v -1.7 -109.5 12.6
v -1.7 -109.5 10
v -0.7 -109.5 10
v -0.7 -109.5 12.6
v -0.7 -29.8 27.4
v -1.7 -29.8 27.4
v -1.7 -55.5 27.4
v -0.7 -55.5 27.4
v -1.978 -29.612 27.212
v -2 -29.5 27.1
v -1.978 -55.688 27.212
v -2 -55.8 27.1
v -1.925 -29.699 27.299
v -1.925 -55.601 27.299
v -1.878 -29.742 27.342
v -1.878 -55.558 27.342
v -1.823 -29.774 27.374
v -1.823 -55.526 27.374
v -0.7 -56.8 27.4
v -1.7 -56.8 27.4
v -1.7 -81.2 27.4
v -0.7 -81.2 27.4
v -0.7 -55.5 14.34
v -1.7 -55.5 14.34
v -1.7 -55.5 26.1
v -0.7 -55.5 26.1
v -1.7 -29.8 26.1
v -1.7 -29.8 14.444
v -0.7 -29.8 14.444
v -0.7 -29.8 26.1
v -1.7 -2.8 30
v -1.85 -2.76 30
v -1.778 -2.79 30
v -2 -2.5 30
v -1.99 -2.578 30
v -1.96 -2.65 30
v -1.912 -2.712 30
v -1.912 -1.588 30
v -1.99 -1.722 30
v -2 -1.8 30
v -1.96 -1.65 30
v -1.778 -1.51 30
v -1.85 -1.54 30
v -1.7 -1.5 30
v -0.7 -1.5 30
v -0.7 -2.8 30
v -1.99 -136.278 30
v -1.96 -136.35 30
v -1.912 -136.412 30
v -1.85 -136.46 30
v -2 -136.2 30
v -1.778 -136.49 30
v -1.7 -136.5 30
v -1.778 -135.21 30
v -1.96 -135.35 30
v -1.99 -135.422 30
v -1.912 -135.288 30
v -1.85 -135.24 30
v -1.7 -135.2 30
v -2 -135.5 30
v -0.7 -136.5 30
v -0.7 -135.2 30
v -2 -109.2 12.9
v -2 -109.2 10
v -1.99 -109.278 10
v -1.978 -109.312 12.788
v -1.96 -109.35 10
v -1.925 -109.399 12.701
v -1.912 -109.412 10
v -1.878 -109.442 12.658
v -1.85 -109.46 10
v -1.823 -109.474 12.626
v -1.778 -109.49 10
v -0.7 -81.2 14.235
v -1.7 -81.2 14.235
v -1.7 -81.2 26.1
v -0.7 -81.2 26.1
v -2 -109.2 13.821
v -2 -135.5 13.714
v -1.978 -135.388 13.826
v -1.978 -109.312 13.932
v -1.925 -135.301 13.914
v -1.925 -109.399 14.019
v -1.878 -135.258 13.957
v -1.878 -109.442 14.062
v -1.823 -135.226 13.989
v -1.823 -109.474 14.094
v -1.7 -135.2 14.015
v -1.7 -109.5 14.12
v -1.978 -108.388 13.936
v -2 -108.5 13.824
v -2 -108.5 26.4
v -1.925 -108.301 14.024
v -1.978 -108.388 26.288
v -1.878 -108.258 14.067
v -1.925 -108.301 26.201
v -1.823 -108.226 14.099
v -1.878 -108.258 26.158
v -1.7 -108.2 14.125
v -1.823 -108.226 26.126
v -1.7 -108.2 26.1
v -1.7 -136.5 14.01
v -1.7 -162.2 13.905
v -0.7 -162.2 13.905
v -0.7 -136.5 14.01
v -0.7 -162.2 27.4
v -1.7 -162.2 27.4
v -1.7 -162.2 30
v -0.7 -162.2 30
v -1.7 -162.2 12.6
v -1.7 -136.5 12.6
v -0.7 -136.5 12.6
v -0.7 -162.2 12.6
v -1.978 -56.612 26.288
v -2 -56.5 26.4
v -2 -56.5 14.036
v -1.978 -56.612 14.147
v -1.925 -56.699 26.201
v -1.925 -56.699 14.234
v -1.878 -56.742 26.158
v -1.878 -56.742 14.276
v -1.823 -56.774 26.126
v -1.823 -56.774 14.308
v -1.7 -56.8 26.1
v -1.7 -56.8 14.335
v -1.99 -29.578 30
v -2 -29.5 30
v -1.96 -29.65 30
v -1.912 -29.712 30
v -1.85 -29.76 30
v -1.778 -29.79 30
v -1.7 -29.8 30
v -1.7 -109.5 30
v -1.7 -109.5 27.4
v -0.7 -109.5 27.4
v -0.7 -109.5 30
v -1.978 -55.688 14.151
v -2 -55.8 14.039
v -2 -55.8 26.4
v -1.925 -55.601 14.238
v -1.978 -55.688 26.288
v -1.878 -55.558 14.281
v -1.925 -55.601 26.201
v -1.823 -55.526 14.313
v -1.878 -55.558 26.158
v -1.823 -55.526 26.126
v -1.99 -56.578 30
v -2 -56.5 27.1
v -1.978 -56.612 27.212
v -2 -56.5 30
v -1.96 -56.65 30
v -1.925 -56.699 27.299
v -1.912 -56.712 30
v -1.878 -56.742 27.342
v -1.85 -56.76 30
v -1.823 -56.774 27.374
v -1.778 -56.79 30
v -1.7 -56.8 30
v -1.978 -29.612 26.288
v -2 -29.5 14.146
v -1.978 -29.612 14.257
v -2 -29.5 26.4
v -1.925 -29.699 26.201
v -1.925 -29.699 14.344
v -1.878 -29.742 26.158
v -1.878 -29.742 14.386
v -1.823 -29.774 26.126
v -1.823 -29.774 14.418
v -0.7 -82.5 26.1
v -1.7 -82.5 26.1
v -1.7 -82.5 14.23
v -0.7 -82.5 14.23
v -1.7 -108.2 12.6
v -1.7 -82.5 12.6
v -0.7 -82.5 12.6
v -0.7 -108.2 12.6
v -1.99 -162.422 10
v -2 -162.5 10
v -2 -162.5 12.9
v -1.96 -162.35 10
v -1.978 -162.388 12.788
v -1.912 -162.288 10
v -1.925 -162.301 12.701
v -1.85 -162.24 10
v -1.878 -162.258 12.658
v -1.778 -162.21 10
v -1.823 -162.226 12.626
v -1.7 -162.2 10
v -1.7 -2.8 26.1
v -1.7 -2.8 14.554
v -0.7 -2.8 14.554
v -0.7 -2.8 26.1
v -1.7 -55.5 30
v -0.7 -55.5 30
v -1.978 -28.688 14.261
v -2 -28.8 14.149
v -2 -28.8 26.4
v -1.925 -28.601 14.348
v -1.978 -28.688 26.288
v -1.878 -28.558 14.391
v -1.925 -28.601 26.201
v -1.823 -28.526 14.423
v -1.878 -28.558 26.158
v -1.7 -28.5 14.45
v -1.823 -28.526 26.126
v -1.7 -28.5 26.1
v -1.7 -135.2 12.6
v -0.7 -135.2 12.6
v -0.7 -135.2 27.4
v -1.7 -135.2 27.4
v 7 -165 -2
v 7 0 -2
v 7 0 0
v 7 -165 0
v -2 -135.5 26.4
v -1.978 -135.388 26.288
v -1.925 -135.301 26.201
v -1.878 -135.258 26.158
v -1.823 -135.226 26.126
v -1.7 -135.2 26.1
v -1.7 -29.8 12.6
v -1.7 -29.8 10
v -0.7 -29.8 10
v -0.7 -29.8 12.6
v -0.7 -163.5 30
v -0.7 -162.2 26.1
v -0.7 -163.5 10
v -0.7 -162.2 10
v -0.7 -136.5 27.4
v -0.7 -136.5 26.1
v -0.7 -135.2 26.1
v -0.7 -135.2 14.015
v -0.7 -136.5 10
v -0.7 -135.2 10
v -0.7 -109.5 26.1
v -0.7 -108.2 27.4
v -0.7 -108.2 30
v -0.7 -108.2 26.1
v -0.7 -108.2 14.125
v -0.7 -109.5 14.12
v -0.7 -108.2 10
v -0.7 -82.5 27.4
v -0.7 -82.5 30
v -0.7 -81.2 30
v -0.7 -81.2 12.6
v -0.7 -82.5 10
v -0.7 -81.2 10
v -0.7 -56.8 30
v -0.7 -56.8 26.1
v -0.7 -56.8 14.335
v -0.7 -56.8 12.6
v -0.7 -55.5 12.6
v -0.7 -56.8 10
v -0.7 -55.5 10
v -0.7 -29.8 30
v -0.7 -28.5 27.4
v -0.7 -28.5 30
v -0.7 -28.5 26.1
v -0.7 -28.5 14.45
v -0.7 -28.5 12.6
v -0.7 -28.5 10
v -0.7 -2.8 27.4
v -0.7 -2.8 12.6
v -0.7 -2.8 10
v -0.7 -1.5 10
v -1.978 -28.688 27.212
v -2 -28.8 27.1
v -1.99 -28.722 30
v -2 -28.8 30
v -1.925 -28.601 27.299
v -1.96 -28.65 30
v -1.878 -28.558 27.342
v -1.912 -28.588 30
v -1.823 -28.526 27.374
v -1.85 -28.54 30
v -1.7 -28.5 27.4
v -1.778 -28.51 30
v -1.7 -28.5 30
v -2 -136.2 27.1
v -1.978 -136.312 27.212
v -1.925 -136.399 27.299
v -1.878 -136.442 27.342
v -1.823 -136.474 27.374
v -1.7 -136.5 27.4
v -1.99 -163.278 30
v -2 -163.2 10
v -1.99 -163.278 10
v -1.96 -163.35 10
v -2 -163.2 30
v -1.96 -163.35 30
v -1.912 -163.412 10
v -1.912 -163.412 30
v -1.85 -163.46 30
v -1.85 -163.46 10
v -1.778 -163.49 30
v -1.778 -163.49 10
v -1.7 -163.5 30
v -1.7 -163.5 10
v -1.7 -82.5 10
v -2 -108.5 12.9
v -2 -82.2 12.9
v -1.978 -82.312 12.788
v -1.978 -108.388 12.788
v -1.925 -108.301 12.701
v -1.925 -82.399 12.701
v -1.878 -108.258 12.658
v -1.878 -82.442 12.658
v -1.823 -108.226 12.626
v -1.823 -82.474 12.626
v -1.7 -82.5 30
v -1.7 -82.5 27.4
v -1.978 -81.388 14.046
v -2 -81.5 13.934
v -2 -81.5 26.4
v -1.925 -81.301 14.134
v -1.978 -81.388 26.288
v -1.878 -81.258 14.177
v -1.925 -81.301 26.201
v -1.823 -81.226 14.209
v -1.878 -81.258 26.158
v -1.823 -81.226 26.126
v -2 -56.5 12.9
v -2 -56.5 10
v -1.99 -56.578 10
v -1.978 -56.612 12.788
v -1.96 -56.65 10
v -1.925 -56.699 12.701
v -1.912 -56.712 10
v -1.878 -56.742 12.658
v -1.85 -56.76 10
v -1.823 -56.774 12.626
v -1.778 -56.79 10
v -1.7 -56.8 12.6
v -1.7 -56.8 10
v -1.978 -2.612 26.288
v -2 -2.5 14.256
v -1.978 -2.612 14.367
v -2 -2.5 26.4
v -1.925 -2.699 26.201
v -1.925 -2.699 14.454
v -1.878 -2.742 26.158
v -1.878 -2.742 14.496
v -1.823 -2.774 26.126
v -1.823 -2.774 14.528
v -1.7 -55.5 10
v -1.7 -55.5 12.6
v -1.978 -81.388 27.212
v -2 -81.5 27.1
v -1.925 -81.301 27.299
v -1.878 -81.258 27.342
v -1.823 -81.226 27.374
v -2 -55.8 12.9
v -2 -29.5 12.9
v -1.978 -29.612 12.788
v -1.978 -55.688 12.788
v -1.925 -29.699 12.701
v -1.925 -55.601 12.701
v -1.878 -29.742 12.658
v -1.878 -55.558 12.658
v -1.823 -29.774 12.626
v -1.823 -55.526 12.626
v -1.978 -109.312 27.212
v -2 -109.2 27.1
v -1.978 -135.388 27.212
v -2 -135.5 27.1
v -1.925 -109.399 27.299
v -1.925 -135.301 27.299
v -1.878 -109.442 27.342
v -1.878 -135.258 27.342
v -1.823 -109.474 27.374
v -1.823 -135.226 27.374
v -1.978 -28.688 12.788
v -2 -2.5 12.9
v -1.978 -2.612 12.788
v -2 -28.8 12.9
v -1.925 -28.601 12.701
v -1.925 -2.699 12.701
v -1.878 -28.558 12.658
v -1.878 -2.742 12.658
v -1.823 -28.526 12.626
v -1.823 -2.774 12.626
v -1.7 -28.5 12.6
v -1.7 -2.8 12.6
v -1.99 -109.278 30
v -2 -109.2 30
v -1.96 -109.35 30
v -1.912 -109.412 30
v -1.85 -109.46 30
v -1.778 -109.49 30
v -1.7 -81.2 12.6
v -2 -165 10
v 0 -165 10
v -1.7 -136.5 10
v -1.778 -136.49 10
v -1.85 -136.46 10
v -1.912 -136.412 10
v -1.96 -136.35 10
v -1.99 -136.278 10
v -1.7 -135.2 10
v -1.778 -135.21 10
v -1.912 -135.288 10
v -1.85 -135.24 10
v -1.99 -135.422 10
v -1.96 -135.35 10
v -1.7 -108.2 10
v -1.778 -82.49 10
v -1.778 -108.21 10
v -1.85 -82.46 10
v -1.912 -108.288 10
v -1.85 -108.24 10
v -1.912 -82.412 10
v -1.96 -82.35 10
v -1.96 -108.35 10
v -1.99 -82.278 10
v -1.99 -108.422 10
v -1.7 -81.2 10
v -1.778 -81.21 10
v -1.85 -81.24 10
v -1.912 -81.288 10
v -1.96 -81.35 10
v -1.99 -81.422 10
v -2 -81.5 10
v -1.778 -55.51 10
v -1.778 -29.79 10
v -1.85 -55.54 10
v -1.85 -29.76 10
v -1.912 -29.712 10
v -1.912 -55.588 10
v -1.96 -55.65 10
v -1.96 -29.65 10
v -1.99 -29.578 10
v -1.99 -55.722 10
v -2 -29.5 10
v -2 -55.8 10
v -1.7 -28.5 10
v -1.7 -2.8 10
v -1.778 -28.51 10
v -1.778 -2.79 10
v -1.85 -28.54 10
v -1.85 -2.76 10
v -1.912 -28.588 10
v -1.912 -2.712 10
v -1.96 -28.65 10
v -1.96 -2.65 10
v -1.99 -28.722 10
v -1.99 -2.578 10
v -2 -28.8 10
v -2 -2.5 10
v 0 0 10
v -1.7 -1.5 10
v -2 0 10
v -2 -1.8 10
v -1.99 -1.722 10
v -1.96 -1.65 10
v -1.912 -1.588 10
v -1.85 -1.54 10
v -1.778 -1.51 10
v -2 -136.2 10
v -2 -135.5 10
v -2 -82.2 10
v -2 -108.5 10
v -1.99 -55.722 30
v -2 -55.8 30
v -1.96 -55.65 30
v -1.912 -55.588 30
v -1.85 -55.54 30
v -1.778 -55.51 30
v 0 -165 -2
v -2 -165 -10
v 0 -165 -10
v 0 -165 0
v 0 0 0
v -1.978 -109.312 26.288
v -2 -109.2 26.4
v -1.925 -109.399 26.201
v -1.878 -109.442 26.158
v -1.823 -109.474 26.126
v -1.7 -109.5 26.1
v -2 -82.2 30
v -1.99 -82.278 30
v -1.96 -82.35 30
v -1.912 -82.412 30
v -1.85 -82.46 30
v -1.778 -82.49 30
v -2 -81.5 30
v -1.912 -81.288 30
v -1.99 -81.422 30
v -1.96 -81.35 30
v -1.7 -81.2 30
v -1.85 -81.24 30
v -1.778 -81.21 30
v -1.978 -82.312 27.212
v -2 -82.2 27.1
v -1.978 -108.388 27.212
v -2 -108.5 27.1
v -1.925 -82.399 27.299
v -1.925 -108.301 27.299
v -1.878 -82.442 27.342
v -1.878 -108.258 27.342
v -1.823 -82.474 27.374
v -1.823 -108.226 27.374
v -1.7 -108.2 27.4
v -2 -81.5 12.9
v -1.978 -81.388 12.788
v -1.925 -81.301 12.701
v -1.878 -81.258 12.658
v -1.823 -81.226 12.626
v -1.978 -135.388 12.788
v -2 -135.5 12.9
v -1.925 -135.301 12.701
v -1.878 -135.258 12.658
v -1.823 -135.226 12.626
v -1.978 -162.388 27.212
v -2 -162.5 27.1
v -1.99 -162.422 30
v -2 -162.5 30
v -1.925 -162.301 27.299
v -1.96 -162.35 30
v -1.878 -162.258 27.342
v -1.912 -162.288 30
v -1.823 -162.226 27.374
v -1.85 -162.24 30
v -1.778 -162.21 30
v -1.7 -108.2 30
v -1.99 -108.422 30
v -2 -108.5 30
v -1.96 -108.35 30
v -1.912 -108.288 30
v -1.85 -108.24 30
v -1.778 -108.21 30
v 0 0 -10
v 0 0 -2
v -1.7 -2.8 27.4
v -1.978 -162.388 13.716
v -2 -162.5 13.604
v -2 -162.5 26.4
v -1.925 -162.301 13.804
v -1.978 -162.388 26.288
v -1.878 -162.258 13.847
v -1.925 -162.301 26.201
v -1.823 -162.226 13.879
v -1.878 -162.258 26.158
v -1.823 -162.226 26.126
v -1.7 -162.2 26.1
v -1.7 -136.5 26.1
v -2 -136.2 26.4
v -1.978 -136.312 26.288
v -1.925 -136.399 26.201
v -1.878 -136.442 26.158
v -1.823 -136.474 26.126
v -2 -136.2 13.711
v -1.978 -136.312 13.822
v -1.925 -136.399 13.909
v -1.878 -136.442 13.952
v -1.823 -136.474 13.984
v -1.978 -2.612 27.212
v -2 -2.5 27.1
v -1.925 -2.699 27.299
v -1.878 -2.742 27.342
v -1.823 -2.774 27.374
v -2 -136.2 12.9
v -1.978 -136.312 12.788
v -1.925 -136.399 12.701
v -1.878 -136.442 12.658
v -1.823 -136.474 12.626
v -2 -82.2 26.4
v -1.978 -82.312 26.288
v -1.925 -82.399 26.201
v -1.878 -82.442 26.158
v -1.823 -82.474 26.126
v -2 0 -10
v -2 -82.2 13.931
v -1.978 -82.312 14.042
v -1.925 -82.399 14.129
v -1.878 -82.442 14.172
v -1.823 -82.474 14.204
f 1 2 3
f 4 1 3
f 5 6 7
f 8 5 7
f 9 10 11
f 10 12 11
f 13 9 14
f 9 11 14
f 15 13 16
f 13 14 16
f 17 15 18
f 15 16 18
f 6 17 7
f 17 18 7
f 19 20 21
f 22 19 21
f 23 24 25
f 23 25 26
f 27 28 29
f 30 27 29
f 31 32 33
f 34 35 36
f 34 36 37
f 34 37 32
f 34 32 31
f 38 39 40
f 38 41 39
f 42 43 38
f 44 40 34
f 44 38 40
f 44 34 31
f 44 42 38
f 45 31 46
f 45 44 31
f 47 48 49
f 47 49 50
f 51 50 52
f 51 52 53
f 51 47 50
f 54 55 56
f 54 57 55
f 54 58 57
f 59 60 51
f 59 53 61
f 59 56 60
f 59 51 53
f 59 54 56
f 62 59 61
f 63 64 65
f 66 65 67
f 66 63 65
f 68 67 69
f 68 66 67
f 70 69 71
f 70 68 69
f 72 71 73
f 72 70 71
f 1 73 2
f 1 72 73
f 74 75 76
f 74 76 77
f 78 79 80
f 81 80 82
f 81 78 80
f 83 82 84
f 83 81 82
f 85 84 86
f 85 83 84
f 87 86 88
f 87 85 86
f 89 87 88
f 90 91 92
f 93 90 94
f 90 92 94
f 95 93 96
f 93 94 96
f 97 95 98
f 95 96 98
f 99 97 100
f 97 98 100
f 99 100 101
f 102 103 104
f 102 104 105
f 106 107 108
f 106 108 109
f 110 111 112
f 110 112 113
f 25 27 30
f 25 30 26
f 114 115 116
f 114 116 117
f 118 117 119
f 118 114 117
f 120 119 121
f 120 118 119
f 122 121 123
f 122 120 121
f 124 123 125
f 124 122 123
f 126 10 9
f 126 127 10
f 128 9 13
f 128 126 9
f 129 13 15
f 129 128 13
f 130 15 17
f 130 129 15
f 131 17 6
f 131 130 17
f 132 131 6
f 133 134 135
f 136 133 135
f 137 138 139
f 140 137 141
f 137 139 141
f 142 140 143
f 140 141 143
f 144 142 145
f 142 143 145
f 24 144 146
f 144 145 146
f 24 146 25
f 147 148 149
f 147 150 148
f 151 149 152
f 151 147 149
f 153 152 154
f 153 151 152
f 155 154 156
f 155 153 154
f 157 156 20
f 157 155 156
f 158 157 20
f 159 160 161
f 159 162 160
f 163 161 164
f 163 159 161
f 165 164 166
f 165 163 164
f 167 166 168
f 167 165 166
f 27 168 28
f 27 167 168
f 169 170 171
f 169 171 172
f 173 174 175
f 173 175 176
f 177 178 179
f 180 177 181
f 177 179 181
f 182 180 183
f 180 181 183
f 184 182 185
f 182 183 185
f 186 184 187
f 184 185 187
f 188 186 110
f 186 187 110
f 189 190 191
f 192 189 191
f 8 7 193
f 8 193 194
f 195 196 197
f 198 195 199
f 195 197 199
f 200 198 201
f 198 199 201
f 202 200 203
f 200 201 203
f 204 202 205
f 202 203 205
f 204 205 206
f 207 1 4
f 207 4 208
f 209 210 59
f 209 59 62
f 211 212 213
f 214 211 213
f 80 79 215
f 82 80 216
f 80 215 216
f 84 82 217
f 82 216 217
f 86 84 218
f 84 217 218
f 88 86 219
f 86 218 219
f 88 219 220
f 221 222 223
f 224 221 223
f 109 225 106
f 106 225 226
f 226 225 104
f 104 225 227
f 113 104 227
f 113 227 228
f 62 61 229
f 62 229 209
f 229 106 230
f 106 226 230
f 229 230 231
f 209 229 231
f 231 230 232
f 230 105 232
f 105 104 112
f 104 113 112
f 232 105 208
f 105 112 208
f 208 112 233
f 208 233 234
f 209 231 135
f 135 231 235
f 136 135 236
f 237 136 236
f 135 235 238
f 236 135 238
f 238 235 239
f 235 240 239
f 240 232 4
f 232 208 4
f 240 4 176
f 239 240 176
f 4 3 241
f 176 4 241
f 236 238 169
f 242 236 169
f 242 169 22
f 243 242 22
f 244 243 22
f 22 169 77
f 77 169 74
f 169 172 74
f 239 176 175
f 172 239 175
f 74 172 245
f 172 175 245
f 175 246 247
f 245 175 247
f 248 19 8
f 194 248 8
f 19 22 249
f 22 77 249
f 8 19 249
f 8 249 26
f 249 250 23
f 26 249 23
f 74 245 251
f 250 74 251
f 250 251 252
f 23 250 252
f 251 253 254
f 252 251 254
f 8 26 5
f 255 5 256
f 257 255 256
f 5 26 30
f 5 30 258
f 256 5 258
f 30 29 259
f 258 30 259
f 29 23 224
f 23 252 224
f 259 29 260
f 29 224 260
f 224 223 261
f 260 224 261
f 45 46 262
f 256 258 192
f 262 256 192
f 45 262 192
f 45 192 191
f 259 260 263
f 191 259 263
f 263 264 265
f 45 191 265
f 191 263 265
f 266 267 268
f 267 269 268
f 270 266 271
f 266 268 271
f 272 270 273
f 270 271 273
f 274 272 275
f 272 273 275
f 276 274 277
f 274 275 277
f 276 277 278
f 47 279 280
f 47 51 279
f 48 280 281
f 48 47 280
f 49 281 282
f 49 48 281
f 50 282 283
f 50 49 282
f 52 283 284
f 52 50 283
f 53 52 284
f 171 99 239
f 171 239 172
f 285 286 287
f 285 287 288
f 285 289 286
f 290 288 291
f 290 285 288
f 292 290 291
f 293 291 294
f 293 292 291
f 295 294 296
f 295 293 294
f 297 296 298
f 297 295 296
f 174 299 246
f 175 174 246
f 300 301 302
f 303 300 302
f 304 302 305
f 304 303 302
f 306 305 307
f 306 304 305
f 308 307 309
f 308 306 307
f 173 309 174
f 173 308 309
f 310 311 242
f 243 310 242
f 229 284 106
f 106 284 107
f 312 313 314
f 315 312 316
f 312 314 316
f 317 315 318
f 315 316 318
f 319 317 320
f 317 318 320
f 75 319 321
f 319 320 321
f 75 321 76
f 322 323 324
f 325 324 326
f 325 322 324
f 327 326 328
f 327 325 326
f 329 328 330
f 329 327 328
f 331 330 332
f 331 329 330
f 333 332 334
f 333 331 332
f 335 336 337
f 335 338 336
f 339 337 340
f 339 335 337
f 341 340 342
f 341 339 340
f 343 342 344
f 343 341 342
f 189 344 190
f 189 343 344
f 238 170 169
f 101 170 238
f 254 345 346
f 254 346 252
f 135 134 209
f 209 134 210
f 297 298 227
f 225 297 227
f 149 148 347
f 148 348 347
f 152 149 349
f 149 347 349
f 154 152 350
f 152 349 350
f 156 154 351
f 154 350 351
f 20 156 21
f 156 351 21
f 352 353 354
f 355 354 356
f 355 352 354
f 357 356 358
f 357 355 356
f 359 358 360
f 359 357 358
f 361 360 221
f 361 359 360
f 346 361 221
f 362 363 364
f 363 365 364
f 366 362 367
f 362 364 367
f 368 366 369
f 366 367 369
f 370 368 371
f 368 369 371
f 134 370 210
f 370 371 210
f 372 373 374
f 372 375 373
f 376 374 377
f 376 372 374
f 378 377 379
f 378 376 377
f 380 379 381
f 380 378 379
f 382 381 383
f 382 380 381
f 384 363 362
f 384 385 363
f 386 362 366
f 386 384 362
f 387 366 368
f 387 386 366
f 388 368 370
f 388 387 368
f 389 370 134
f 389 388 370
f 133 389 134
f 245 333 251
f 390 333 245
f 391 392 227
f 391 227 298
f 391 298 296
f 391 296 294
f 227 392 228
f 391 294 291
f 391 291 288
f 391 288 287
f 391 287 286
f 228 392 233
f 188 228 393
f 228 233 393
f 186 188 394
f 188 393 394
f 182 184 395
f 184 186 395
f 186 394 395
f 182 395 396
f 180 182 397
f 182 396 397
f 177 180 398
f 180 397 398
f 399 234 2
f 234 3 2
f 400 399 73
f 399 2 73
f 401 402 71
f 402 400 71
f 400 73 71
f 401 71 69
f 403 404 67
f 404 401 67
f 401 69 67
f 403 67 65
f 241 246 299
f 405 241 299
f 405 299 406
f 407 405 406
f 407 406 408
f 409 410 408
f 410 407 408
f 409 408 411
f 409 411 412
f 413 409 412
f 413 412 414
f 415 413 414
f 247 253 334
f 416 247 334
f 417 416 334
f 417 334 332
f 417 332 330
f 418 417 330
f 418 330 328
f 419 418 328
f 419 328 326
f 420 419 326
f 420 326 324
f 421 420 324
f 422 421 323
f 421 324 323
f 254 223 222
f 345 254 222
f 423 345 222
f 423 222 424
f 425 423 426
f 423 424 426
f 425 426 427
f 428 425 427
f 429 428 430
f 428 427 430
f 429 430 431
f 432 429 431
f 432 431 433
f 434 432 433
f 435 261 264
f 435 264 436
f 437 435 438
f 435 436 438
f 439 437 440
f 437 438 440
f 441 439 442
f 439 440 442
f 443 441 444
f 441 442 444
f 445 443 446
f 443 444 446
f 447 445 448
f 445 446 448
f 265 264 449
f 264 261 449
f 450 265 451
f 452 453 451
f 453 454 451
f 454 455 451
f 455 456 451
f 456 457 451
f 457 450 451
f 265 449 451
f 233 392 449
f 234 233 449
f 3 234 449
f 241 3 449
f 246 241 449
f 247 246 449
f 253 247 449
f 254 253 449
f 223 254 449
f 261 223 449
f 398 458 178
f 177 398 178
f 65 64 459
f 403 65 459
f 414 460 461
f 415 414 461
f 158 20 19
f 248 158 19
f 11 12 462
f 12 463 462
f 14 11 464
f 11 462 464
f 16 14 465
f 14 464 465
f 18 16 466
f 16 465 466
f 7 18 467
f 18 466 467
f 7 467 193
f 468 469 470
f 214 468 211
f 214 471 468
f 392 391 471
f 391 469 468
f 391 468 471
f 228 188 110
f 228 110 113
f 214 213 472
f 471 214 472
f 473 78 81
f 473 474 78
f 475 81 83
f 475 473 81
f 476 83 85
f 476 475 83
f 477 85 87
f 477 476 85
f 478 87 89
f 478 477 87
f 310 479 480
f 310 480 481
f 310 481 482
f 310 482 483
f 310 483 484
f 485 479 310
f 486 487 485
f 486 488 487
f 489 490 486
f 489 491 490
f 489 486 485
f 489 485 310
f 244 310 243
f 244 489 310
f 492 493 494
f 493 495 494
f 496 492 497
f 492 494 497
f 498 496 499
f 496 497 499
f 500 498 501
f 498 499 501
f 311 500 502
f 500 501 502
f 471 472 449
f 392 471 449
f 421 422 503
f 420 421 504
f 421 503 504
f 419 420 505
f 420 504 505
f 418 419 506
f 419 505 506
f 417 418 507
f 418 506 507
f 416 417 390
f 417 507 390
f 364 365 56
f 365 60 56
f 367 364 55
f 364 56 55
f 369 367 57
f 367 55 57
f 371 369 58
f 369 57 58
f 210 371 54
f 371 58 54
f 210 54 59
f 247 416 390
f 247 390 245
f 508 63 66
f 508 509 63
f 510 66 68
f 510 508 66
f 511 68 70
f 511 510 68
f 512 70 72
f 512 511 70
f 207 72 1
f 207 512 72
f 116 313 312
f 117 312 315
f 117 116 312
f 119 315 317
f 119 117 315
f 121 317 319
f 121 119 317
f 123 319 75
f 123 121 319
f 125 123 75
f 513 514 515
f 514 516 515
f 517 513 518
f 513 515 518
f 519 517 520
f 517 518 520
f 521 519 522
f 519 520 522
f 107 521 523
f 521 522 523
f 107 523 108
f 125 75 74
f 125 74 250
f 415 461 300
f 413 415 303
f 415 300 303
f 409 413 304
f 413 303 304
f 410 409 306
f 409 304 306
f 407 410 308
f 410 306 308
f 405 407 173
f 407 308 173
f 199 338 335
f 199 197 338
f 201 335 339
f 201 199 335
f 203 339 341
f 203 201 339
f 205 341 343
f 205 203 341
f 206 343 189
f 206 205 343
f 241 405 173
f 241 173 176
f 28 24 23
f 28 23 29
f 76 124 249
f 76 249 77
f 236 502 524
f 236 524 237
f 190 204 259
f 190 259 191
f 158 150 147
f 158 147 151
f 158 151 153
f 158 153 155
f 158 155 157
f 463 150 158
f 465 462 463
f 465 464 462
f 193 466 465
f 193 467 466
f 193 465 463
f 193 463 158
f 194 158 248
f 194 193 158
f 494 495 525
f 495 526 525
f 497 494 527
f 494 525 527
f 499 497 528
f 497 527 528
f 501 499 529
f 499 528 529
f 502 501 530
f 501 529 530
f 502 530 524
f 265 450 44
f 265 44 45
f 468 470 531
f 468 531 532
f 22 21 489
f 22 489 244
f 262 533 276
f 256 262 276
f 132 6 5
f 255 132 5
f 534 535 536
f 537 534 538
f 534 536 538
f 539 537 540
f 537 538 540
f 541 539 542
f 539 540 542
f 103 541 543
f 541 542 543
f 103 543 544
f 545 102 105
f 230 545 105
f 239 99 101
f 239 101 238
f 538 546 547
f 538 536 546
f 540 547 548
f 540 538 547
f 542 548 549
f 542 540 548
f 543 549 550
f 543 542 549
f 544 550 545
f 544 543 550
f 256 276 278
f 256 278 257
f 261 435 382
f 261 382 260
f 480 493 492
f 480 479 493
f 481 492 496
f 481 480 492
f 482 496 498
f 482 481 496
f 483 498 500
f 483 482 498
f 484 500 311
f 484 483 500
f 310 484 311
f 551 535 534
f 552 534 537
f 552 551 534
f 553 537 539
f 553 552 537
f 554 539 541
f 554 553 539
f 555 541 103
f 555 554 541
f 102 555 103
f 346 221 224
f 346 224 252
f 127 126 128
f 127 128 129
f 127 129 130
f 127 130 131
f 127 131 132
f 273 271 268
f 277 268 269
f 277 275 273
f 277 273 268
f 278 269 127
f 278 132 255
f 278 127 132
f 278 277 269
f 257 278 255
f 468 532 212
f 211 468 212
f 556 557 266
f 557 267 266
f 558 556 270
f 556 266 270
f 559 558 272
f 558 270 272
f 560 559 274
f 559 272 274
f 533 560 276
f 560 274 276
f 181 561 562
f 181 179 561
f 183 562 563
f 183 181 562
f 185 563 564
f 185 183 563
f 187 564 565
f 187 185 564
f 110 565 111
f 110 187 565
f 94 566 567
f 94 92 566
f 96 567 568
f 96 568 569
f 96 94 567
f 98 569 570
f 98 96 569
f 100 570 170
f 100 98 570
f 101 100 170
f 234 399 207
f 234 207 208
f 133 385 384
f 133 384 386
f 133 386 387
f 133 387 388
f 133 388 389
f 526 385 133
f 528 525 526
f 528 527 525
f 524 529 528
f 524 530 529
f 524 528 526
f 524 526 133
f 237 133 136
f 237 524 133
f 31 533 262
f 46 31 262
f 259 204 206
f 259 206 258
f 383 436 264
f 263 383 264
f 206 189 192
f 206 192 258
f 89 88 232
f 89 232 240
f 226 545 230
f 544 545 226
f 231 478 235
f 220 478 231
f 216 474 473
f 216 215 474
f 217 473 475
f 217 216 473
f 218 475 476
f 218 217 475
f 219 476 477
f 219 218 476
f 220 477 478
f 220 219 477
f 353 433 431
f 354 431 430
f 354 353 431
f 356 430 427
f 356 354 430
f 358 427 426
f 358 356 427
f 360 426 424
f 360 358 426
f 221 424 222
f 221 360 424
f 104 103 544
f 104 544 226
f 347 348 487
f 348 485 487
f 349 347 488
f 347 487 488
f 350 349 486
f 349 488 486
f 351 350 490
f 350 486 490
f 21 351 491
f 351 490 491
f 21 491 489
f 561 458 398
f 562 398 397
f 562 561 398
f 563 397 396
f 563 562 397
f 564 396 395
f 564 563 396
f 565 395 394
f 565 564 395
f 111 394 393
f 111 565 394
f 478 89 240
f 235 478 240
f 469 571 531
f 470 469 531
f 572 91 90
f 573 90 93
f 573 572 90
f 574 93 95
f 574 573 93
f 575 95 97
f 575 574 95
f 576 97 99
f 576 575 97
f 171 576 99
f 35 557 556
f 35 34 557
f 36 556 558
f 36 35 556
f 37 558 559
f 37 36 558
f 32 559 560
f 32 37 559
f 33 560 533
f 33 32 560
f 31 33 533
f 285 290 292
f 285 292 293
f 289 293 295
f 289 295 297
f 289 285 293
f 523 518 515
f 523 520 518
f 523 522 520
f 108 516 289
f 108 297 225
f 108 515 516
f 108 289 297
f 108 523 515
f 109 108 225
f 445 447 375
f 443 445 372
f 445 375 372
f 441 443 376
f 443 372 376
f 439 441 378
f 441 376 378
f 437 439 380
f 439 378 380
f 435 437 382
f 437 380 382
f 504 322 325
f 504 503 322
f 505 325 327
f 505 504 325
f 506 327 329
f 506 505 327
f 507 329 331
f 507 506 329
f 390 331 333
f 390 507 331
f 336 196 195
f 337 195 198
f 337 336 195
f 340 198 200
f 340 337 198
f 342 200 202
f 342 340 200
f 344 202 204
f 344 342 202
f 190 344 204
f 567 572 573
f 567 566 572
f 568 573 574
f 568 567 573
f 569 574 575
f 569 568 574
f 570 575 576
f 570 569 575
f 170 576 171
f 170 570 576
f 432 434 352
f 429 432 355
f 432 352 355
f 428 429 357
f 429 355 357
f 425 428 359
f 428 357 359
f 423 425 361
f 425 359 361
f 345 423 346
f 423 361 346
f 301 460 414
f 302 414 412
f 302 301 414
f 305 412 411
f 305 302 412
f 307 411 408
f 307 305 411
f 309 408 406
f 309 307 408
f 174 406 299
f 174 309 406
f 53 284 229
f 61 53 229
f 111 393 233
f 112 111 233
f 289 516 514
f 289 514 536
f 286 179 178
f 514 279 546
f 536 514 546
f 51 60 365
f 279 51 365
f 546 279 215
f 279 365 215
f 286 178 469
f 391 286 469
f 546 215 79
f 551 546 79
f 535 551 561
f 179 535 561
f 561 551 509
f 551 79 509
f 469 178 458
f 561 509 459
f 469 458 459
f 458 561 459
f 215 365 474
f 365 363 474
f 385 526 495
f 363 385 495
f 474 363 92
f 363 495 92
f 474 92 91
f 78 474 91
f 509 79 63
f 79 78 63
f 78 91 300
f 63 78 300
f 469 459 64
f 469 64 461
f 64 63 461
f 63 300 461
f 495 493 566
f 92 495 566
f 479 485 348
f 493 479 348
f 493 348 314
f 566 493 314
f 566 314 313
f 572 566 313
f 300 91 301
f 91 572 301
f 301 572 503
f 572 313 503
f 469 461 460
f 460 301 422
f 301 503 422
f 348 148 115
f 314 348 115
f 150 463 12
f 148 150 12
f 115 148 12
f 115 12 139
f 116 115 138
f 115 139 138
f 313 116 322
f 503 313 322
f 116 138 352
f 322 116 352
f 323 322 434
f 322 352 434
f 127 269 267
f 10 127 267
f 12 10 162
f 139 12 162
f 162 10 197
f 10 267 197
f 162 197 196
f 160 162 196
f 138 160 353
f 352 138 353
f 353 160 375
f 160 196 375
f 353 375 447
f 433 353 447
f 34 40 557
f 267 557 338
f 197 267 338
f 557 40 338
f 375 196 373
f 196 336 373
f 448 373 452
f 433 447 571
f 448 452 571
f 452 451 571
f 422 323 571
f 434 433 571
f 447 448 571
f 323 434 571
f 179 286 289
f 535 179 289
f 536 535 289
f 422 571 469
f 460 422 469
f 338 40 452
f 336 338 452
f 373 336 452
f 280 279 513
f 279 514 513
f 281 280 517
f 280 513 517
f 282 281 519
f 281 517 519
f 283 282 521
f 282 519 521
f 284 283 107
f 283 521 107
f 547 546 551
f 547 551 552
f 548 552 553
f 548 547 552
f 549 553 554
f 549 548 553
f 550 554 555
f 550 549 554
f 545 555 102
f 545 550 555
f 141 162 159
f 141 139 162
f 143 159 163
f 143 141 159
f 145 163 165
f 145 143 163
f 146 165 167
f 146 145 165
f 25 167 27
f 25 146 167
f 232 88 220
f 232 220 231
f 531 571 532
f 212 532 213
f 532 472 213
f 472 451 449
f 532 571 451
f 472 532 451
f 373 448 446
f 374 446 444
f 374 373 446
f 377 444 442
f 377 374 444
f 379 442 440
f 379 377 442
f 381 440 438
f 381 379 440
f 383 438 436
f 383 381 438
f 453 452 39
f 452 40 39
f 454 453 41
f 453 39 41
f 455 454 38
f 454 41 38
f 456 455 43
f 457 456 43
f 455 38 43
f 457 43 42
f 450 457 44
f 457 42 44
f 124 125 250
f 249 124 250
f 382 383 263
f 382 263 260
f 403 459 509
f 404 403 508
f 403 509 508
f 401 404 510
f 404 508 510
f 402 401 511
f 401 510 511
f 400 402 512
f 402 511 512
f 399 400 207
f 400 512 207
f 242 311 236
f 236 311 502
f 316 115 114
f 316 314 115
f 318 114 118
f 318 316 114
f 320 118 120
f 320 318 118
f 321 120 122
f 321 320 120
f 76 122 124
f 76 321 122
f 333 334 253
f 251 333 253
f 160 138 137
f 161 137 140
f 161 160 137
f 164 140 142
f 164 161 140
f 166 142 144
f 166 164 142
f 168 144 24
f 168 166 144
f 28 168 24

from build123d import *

# Parameters (mm, degrees)
F1_DEPTH = 165
F2_W     = 1.3
F2_H     = 1.3
F3_DEPTH = 20
F4_W     = 25.7
F4_H     = 1.3
F4_W_2   = 24.4
F5_DEPTH = 1.3
F6_R     = 0.3


with BuildPart() as f1:
    # F0 (on Front) → F1 (new body)
    with BuildSketch(Plane.XZ):
        Polygon((7, 0), (0, 0), (0, 10), (-2, 10), (-2, -10), (0, -10), (0, -2), (7, -2), align=None)
    extrude(amount=F1_DEPTH)

    # F2 (on face) → F3 (join)
    with BuildSketch(Plane.XY.offset(10)):
        with Locations((-1.35, -2.15)):
            Rectangle(F2_W, F2_H)
        with Locations((-1.35, -29.15)):
            Rectangle(F2_W, F2_H)
        with Locations((-1.35, -56.15)):
            Rectangle(F2_W, F2_H)
        with Locations((-1.35, -81.85)):
            Rectangle(F2_W, F2_H)
        with Locations((-1.35, -108.85)):
            Rectangle(F2_W, F2_H)
        with Locations((-1.35, -135.85)):
            Rectangle(F2_W, F2_H)
        with Locations((-1.35, -162.85)):
            Rectangle(F2_W, F2_H)
    extrude(amount=F3_DEPTH)

    # F4 (on face) → F5 (join)
    with BuildSketch(Plane(origin=(-2, 0, 0), x_dir=(0, -1, 0), z_dir=(-1, 0, 0))):
        Polygon((2.8, 14.5544293599), (2.8, 12.6), (28.5, 12.6), (28.5, 14.4497695307), align=None)
        with Locations((15.65, 26.75)):
            Rectangle(F4_W, F4_H)
        with Locations((42.65, 26.75)):
            Rectangle(F4_W, F4_H)
        Polygon((29.8, 14.4444754537), (29.8, 12.6), (55.5, 12.6), (55.5, 14.3398156246), align=None)
        with Locations((69, 26.75)):
            Rectangle(F4_W_2, F4_H)
        Polygon((56.8, 14.3345215476), (56.8, 12.6), (81.2, 12.6), (81.2, 14.2351557954), align=None)
        Polygon((82.5, 14.2298617184), (82.5, 12.6), (108.2, 12.6), (108.2, 14.1252018892), align=None)
        with Locations((95.35, 26.75)):
            Rectangle(F4_W, F4_H)
        with Locations((122.35, 26.75)):
            Rectangle(F4_W, F4_H)
        Polygon((109.5, 12.6), (135.2, 12.6), (135.2, 14.0152479831), (109.5, 14.1199078123), align=None)
        Polygon((136.5, 12.6), (162.2, 12.6), (162.2, 13.905294077), (136.5, 14.0099539061), align=None)
        with Locations((149.35, 26.75)):
            Rectangle(F4_W, F4_H)
    extrude(amount=-F5_DEPTH)

    # F6
    f6_edges = [f1.edges().sort_by_distance(p)[0] for p in [
        (-2, -135.2, 11.3),
        (-2, -136.5, 11.3),
        (-2, -149.35, 12.6),
        (-2, -149.35, 13.957624),
        (-2, -162.2, 11.3),
        (-2, -163.5, 20),
        (-2, -162.2, 20.002647),
        (-2, -149.35, 27.4),
        (-2, -149.35, 26.1),
        (-2, -136.5, 20.054977),
        (-2, -136.5, 28.7),
        (-2, -135.2, 28.7),
        (-2, -135.2, 20.057624),
        (-2, -122.35, 14.067578),
        (-2, -122.35, 12.6),
        (-2, -122.35, 26.1),
        (-2, -122.35, 27.4),
        (-2, -162.2, 28.7),
        (-2, -109.5, 28.7),
        (-2, -95.35, 27.4),
        (-2, -95.35, 14.177532),
        (-2, -108.2, 20.112601),
        (-2, -95.35, 12.6),
        (-2, -108.2, 11.3),
        (-2, -82.5, 20.164931),
        (-2, -82.5, 28.7),
        (-2, -69, 27.4),
        (-2, -69, 26.1),
        (-2, -81.2, 20.167578),
        (-2, -69, 14.284839),
        (-2, -69, 12.6),
        (-2, -82.5, 11.3),
        (-2, -81.2, 28.7),
        (-2, -81.2, 11.3),
        (-2, -56.8, 28.7),
        (-2, -56.8, 20.217261),
        (-2, -56.8, 11.3),
        (-2, -42.65, 12.6),
        (-2, -42.65, 14.392146),
        (-2, -55.5, 20.219908),
        (-2, -42.65, 26.1),
        (-2, -42.65, 27.4),
        (-2, -55.5, 28.7),
        (-2, -29.8, 28.7),
        (-2, -15.65, 27.4),
        (-2, -15.65, 26.1),
        (-2, -29.8, 20.272238),
        (-2, -28.5, 20.274885),
        (-2, -29.8, 11.3),
        (-2, -28.5, 28.7),
        (-2, -2.8, 28.7),
        (-2, -1.5, 20),
        (-2, -2.8, 20.327215),
        (-2, -15.65, 14.502099),
        (-2, -15.65, 12.6),
        (-2, -2.8, 11.3),
        (-2, -28.5, 11.3),
        (-2, -55.5, 11.3),
        (-2, -95.35, 26.1),
        (-2, -109.5, 11.3),
        (-2, -109.5, 20.109954),
        (-2, -108.2, 28.7),
    ]]
    fillet(f6_edges, radius=F6_R)


solid = f1.part
